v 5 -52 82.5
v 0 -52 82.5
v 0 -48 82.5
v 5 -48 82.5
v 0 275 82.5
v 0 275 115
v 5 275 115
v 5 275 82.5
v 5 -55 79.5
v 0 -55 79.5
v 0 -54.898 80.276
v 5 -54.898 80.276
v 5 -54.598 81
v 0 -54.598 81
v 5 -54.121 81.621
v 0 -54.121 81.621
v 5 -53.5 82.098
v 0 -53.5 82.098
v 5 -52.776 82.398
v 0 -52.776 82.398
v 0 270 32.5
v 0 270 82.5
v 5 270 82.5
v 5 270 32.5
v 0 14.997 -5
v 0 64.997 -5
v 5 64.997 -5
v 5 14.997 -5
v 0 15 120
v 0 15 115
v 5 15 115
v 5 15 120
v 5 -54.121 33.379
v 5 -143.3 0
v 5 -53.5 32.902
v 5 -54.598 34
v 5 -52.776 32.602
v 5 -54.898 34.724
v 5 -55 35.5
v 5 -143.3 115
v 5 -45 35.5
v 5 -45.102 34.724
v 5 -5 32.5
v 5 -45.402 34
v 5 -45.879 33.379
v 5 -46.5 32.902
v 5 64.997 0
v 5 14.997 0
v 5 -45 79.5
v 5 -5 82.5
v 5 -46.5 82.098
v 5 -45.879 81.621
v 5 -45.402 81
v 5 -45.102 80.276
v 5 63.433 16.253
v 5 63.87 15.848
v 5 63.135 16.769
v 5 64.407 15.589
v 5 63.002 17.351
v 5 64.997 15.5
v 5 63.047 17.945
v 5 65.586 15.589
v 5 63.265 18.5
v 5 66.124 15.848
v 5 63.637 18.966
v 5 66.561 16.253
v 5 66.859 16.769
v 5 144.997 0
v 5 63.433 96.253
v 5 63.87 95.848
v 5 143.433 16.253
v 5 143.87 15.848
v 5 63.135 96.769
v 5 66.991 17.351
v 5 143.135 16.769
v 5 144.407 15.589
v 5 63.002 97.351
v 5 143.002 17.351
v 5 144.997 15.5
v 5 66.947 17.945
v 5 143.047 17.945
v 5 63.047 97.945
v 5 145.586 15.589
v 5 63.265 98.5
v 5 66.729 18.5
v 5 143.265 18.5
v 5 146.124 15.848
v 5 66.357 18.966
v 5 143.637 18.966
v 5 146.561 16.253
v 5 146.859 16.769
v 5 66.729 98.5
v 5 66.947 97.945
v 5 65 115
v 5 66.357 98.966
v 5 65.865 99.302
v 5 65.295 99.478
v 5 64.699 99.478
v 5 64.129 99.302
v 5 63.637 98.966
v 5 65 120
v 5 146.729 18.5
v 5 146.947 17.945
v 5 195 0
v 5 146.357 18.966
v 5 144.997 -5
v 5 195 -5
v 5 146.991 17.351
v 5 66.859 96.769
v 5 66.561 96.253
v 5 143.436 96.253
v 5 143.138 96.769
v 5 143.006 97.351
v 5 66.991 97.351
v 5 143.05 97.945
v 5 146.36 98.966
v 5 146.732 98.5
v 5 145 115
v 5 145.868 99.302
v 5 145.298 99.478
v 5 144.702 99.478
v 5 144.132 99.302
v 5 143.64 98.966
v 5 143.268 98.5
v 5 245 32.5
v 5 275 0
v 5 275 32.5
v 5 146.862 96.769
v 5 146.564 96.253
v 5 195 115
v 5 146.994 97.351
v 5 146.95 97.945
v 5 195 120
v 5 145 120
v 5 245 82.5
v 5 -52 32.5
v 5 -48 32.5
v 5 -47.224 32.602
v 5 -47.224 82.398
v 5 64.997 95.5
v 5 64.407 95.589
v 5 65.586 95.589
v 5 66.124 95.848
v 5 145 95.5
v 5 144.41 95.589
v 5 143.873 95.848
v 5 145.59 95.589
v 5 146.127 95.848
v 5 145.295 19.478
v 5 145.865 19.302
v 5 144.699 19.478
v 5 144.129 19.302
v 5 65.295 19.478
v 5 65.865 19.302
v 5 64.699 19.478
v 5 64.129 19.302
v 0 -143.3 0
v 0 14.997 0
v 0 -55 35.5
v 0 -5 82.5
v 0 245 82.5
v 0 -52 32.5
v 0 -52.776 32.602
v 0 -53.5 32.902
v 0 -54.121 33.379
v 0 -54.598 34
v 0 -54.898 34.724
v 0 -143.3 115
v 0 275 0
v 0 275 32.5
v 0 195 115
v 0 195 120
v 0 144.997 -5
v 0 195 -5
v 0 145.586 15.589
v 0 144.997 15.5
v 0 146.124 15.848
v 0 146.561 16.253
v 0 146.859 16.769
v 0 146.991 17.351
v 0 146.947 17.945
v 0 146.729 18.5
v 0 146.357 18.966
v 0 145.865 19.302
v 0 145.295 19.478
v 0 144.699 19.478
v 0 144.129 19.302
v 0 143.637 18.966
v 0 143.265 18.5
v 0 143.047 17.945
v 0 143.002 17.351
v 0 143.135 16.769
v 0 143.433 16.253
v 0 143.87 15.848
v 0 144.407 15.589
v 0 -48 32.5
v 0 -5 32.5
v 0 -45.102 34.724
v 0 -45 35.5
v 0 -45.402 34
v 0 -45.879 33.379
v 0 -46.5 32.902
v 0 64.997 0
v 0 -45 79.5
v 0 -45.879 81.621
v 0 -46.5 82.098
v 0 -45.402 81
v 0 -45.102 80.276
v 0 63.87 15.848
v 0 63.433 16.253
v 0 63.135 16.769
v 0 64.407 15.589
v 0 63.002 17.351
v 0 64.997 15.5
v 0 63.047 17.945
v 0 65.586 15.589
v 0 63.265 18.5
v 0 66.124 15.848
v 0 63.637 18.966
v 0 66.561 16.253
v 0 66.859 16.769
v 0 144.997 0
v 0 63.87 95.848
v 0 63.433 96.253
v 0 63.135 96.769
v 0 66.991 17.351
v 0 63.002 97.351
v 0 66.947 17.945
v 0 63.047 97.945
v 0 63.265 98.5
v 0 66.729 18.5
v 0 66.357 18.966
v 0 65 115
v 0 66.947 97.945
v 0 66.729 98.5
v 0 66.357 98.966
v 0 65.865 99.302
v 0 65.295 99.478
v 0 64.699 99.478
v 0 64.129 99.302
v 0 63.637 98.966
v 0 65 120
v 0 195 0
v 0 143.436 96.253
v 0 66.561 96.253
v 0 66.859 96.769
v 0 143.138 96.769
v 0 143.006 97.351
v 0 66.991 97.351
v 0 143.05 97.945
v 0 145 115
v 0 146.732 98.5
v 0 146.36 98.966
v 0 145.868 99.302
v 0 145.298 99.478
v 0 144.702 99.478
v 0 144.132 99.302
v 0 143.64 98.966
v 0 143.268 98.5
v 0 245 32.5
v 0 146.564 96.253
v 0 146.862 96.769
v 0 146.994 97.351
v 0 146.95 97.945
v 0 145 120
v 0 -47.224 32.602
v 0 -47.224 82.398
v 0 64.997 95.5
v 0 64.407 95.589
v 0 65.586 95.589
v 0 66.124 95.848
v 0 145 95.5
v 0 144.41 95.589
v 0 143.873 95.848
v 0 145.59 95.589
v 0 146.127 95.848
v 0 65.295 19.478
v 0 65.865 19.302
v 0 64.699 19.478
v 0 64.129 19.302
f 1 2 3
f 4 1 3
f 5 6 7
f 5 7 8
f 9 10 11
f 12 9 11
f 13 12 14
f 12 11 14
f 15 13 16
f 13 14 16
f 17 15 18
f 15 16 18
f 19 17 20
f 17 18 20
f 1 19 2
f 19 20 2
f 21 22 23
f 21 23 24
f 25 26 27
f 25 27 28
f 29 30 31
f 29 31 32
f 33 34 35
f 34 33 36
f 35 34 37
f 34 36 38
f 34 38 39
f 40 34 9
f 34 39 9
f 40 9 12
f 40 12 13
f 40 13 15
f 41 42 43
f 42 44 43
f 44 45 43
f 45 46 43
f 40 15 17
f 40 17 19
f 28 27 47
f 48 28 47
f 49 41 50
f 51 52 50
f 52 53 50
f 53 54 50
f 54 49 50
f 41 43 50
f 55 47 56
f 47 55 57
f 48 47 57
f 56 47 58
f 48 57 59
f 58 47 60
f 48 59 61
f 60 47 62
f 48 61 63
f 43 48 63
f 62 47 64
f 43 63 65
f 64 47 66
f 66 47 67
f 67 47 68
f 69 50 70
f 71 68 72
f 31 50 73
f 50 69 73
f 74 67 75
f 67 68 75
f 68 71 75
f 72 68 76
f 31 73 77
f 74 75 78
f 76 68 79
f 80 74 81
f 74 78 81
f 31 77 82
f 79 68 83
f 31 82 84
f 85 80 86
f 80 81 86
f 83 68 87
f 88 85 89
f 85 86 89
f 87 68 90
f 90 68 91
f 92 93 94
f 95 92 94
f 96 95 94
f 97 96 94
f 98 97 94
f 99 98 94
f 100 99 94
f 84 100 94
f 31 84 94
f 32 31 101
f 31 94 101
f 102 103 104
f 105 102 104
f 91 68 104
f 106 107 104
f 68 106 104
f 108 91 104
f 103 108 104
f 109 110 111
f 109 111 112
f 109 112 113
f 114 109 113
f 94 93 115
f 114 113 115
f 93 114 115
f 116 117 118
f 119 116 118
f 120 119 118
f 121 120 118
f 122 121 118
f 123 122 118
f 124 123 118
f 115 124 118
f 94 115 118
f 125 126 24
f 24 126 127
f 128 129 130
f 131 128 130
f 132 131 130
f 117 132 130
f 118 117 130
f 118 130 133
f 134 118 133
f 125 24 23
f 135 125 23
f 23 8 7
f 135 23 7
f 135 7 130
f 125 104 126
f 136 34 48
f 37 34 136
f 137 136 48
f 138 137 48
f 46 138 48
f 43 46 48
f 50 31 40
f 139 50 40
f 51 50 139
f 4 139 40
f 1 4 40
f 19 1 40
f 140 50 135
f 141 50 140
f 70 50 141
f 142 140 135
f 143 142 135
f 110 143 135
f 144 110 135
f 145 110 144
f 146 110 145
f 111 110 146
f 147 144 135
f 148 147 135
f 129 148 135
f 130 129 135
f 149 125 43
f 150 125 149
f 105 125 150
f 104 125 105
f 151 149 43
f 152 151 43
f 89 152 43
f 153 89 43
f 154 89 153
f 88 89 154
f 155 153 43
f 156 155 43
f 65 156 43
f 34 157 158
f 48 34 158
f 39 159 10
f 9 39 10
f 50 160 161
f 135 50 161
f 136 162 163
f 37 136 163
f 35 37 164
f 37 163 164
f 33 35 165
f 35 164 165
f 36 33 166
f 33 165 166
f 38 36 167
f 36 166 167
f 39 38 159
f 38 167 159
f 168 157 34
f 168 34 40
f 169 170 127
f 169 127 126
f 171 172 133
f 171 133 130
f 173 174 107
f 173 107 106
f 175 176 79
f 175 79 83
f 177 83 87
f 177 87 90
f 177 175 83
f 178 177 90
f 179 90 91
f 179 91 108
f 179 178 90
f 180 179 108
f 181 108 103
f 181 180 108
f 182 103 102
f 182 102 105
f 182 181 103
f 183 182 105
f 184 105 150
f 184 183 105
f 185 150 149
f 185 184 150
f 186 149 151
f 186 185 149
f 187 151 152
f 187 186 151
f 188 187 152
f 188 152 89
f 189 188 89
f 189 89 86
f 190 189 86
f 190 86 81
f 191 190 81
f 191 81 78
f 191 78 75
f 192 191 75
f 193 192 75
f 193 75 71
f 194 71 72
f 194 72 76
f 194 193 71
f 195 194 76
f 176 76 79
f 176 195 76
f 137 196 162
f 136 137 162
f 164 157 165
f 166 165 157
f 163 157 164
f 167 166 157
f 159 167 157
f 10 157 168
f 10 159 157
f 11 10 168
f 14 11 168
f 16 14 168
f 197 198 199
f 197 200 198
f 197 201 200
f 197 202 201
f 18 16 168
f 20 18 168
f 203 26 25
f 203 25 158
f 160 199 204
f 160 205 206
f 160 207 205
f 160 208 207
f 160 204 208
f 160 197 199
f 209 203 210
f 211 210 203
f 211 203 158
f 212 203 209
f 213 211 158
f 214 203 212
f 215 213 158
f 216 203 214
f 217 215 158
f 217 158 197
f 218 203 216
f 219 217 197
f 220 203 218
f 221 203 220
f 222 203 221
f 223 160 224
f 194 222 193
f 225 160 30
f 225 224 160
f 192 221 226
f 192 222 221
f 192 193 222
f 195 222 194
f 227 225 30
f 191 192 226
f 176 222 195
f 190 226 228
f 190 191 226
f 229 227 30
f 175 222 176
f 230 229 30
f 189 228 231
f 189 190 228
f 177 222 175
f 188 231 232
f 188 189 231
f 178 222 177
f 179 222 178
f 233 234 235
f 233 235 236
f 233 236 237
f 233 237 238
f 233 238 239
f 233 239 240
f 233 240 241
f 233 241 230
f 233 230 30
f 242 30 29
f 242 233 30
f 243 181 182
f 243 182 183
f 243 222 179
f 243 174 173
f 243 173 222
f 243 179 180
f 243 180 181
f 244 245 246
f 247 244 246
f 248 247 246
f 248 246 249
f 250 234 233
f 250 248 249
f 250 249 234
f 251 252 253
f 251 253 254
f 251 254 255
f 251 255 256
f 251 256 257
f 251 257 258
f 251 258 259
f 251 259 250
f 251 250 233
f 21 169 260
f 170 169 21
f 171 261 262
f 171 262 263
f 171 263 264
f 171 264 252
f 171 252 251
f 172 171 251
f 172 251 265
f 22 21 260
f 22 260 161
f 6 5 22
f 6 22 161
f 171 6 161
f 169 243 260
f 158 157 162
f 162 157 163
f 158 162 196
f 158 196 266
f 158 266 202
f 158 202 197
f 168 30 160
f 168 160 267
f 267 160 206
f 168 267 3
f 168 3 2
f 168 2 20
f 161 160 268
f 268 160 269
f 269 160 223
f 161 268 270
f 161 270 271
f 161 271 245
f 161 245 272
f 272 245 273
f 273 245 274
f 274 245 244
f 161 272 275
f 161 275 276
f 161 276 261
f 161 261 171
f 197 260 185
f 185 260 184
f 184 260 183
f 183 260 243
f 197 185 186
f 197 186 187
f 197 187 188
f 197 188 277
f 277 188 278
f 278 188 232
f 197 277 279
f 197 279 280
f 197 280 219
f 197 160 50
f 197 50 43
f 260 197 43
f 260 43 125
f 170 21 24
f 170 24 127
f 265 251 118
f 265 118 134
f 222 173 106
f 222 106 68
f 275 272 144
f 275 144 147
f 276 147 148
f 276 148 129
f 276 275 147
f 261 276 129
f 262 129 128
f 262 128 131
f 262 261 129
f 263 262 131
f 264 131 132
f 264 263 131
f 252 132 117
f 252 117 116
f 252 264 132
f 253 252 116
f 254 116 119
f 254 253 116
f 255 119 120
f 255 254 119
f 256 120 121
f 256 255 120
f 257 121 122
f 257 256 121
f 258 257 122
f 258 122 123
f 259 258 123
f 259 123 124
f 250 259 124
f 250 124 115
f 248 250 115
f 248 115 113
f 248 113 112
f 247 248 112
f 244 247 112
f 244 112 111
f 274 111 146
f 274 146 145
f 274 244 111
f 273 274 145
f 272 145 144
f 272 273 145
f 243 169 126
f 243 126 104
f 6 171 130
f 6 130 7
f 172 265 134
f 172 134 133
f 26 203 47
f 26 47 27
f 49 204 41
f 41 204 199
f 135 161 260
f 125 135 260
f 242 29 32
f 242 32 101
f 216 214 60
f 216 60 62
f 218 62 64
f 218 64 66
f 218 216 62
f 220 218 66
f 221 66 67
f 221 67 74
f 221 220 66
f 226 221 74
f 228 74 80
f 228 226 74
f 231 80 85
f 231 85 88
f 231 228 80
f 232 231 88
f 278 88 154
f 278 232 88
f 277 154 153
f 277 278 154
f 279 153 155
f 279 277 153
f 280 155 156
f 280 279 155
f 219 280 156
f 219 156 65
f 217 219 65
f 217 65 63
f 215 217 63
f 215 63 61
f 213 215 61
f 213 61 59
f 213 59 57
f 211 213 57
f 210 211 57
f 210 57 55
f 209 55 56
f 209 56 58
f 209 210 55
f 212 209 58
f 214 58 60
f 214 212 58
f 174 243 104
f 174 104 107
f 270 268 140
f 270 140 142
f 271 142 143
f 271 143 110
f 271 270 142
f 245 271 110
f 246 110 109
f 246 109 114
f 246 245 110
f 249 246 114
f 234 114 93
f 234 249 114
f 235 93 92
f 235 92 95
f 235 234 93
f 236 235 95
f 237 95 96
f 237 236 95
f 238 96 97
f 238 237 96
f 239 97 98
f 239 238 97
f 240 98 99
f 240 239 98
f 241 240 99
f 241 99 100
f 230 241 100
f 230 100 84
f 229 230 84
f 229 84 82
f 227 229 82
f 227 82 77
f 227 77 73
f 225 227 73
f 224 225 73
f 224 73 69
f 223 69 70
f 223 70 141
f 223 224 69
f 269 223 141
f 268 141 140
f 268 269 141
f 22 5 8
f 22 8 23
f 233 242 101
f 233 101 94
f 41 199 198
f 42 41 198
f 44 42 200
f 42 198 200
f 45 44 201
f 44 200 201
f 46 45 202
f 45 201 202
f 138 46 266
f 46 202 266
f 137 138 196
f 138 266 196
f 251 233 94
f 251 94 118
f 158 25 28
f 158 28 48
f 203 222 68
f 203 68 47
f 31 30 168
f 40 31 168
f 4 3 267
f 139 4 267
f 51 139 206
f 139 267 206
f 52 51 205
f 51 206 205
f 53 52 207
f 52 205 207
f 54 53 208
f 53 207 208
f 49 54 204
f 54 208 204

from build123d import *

# Parameters (mm, degrees)
SKETCH_1_R      = 2
SKETCH_1_W      = 50
SKETCH_1_H      = 250
EXTRUDE_1_DEPTH = 5


with BuildPart() as part:
    # 草图1 → 凸台-拉伸1 (new body)
    with BuildSketch(Plane(origin=(0, 0, 0), x_dir=(0, 0, -1), z_dir=(1, 0, 0))):
        Polygon((-115, 195), (-115, 275), (-82.5, 275), (-82.5, 270), (-32.5, 270), (-32.5, 275), (0, 275), (0, 195), (5, 195), (5, 144.996887482), (0, 144.996887482), (0, 64.996887482), (5, 64.996887482), (5, 14.996887482), (0, 14.996887482), (0, 0), (0, -117.3), (0, -143.3), (-115, -143.3), (-115, -117.3), (-115, 0), (-115, 15), (-120, 15), (-120, 65), (-115, 65), (-115, 145), (-120, 145), (-120, 195), align=None)
        with Locations((-97.5, 145)):
            Circle(SKETCH_1_R, mode=Mode.SUBTRACT)
        with Locations((-17.5, 144.996887482)):
            Circle(SKETCH_1_R, mode=Mode.SUBTRACT)
        with Locations((-17.5, 64.996887482)):
            Circle(SKETCH_1_R, mode=Mode.SUBTRACT)
        with Locations((-97.5, 64.996887482)):
            Circle(SKETCH_1_R, mode=Mode.SUBTRACT)
        with Locations((-57.5, 120)):
            Rectangle(SKETCH_1_W, SKETCH_1_H, mode=Mode.SUBTRACT)
        with BuildLine():
            Line((-79.5, -45), (-35.5, -45))
            ThreePointArc((-35.5, -45), (-33.378679656, -45.878679656), (-32.5, -48))
            Line((-32.5, -48), (-32.5, -52))
            ThreePointArc((-32.5, -52), (-33.378679656, -54.121320344), (-35.5, -55))
            Line((-35.5, -55), (-79.5, -55))
            ThreePointArc((-79.5, -55), (-81.621320344, -54.121320344), (-82.5, -52))
            Line((-82.5, -52), (-82.5, -48))
            ThreePointArc((-82.5, -48), (-81.621320344, -45.878679656), (-79.5, -45))
        make_face(mode=Mode.SUBTRACT)
    extrude(amount=EXTRUDE_1_DEPTH)


solid = part.part
